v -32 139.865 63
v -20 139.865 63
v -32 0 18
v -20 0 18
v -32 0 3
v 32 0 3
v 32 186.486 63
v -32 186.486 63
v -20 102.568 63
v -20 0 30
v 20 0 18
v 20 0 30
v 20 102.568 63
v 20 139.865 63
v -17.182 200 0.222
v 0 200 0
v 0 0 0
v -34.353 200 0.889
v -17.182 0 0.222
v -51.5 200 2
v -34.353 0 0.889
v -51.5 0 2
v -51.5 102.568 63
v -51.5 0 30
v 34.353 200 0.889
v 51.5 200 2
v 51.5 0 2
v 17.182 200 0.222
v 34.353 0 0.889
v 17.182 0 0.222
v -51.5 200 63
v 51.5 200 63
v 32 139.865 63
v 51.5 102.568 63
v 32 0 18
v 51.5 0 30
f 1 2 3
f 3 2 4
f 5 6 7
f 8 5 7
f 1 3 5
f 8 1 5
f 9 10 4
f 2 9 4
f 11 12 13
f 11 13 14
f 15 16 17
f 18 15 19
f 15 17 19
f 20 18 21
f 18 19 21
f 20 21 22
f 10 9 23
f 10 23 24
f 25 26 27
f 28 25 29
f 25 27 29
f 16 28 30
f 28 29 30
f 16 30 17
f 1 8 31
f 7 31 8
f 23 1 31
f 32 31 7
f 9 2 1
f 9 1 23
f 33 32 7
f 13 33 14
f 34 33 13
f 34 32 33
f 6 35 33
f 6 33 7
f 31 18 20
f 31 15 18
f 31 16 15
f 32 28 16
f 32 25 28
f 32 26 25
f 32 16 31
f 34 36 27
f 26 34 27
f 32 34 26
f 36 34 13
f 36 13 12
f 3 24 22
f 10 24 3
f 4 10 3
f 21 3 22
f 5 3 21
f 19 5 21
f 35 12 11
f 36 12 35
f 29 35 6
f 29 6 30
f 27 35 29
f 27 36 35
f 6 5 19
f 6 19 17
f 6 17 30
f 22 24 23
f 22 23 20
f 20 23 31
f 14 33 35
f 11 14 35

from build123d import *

# Parameters (mm, degrees)
F1_DEPTH = 51.5
F2_DEPTH = 20
F3_DEPTH = 32
F5_DEPTH = 200.001


with BuildPart() as f1:
    # F0 (on Right) → F1 (new body, symmetric)
    with BuildSketch(Plane.YZ):
        Polygon((0, 3), (0, 0), (200, 0), (200, 63), (186.486487, 63), align=None)
        Polygon((0, 18), (0, 3), (186.486487, 63), (139.864865, 63), align=None)
        Polygon((0, 30), (0, 18), (139.864865, 63), (102.567568, 63), align=None)
    extrude(amount=F1_DEPTH, both=True)

    # F0 (on Right) → F2 (cut, symmetric)
    with BuildSketch(Plane.YZ):
        Polygon((0, 30), (0, 18), (139.864865, 63), (102.567568, 63), align=None)
    extrude(amount=F2_DEPTH, both=True, mode=Mode.SUBTRACT)

    # F0 (on Right) → F3 (cut, symmetric)
    with BuildSketch(Plane.YZ):
        Polygon((0, 18), (0, 3), (186.486487, 63), (139.864865, 63), align=None)
    extrude(amount=F3_DEPTH, both=True, mode=Mode.SUBTRACT)

    # F4 (on Front) → F5 (cut, through all)
    with BuildSketch(Plane.XZ):
        with BuildLine():
            Line((-51.5, 0), (0, 0))
            ThreePointArc((0, 0), (-25.76941, 0.500188), (-51.5, 2))
            Line((-51.5, 2), (-51.5, 0))
        make_face()
        with BuildLine():
            ThreePointArc((51.5, 2), (25.76941, 0.500188), (0, 0))
            Line((0, 0), (51.5, 0))
            Line((51.5, 0), (51.5, 2))
        make_face()
    extrude(amount=-F5_DEPTH, mode=Mode.SUBTRACT)


solid = f1.part
